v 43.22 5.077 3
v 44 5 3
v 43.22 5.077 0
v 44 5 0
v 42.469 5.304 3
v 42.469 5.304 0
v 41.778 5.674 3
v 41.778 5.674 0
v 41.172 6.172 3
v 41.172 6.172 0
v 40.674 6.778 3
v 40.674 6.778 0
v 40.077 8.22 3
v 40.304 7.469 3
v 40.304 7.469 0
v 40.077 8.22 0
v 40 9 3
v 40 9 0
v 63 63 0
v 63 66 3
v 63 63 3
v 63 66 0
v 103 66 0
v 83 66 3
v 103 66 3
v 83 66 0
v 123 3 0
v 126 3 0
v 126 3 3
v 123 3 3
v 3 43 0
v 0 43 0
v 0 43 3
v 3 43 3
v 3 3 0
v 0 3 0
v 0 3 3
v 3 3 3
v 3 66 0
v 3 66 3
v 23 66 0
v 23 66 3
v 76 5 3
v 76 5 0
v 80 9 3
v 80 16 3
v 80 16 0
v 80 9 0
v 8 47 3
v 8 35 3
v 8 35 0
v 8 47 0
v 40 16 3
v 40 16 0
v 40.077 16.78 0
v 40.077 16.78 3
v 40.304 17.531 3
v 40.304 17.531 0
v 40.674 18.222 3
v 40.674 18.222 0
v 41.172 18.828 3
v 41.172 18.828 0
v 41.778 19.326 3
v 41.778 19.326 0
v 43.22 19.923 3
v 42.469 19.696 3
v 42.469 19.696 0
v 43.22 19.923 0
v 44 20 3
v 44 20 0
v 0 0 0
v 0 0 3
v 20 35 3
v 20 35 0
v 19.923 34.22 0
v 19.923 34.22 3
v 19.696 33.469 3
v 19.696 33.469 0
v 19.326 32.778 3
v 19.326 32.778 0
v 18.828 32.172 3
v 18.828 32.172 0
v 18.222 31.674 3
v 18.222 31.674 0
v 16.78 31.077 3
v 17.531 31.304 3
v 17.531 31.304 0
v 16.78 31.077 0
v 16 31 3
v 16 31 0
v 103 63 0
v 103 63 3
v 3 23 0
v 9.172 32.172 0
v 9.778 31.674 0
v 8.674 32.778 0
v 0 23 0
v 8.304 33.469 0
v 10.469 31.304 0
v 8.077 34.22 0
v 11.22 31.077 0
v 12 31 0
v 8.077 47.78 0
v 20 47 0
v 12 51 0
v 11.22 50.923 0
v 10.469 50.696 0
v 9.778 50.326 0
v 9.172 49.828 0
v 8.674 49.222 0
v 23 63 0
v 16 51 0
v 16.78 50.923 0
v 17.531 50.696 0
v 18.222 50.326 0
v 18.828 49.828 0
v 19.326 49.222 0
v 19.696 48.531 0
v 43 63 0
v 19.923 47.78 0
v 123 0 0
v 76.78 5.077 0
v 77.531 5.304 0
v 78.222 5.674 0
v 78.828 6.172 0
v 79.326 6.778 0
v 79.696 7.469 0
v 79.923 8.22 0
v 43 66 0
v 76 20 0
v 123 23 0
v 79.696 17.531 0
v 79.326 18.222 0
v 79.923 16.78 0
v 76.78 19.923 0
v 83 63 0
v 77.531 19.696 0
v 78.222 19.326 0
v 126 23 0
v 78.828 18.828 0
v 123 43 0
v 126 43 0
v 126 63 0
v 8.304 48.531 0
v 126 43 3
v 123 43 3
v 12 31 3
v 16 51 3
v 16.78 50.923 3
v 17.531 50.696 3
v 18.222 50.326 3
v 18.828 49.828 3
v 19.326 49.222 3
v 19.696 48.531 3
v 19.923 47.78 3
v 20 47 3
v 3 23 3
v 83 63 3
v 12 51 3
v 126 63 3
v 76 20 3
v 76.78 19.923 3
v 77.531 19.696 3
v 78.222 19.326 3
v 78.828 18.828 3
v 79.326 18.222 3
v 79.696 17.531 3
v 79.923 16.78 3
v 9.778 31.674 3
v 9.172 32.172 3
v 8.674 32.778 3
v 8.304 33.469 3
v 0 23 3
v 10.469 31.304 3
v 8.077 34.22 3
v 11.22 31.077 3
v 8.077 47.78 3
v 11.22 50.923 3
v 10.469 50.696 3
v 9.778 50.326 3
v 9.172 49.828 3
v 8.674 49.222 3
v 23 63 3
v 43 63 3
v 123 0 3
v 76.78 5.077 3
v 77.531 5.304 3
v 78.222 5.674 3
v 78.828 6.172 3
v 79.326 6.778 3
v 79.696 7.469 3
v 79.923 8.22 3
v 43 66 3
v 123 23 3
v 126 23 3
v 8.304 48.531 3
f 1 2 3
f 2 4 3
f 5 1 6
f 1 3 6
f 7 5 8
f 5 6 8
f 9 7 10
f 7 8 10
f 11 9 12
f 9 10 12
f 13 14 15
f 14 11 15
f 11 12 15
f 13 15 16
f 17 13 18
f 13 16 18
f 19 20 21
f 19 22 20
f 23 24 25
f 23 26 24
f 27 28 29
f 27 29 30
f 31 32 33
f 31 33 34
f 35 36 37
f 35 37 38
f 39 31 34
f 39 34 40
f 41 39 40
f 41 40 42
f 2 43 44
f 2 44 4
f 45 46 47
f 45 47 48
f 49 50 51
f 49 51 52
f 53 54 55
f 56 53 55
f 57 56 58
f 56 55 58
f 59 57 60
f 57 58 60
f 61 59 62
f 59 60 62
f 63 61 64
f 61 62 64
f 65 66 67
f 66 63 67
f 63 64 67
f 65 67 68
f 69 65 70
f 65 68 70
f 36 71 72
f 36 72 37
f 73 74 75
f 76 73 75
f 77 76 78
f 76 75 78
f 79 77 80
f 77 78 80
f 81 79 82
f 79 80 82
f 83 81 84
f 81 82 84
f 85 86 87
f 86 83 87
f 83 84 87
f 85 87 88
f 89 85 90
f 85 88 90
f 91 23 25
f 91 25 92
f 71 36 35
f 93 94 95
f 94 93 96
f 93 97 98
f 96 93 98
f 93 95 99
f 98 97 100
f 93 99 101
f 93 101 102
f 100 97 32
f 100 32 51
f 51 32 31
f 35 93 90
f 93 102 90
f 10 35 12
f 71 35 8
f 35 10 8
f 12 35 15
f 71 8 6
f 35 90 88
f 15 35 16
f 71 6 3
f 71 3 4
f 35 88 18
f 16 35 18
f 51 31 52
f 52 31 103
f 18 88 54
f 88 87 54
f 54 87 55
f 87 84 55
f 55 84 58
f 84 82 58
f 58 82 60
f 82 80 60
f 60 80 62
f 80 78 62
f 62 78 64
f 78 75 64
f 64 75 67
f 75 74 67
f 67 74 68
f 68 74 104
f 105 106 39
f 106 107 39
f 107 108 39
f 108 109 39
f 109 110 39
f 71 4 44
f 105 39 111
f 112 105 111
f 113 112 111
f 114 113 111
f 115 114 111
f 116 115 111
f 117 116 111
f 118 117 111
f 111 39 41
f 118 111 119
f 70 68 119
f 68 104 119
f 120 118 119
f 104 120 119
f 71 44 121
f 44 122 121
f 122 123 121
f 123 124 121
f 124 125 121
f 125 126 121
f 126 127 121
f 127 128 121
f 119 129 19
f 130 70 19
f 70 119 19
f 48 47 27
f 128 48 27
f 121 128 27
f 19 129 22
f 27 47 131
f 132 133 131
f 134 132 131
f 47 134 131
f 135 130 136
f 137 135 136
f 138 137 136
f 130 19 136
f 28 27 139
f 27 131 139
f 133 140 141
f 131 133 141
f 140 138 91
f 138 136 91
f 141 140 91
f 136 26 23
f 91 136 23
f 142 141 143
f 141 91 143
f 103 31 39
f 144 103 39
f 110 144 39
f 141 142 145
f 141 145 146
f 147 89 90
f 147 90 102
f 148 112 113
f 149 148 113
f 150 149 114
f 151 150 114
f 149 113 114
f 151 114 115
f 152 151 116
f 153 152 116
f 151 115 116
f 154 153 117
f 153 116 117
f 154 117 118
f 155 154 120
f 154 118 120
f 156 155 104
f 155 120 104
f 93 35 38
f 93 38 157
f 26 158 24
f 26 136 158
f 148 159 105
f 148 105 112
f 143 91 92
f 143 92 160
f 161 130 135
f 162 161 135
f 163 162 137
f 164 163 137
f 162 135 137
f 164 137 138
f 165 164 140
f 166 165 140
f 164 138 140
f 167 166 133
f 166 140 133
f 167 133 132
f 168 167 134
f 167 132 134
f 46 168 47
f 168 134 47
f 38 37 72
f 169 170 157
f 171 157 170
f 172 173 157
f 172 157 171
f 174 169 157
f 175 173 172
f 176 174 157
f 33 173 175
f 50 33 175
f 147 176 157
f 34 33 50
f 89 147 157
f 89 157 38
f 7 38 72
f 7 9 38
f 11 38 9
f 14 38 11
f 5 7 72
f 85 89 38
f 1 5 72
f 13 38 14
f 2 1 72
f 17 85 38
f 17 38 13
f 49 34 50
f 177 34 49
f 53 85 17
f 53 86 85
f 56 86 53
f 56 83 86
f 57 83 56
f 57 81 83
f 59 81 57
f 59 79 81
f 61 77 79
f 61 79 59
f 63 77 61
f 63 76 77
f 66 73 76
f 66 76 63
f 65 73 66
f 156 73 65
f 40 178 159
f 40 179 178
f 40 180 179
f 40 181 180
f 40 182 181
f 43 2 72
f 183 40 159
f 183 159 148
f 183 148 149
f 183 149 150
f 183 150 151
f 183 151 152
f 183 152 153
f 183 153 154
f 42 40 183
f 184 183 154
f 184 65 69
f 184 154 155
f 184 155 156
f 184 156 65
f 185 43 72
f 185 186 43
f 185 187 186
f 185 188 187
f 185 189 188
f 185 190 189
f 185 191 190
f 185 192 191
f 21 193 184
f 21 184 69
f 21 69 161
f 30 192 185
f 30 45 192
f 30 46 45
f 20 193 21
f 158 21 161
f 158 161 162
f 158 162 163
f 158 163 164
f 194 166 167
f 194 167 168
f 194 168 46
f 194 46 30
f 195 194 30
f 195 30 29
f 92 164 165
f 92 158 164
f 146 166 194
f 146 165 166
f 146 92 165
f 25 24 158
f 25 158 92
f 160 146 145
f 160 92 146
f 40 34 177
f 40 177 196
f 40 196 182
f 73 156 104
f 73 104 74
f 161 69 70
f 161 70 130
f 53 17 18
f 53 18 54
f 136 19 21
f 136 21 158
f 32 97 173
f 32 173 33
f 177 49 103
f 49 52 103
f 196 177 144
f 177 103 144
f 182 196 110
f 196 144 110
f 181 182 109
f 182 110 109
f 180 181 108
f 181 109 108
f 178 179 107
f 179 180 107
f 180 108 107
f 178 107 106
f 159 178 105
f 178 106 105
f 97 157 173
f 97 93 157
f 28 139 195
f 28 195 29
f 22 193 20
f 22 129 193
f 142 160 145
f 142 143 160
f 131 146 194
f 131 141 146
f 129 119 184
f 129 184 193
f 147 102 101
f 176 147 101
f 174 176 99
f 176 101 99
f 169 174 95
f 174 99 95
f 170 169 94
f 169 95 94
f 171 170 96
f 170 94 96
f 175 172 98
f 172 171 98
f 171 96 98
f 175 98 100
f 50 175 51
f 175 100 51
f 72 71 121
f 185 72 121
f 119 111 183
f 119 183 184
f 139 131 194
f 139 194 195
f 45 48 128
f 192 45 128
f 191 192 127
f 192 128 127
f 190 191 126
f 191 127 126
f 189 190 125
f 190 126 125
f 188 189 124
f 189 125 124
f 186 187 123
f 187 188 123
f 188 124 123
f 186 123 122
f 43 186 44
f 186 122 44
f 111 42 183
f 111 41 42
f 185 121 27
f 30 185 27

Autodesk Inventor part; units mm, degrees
ref_plane "YZ Plane" through (0, 0, 0) normal (1, 0, 0) x (0, 1, 0)
ref_plane "XZ Plane" through (0, 0, 0) normal (0, 1, 0) x (-1, 0, 0)
ref_plane "XY Plane" through (0, 0, 0) normal (0, 0, 1) x (1, 0, 0)
sketch "Sketch1" plane through (0, 0, 0) normal (0, 0, 1) x (1, 0, 0)
  line L0 (0, 0) -> (3, 0)
  line L1 (3, 0) -> (123, 0)
  line L2 (0, 0) -> (0, 3)
  line L3 (0, 3) -> (3, 3)
  line L4 (3, 3) -> (3, 23)
  line L5 (3, 23) -> (0, 23)
  line L6 (0, 23) -> (0, 43)
  line L7 (0, 43) -> (3, 43)
  line L8 (3, 43) -> (3, 63)
  line L9 (3, 63) -> (3, 66)
  line L10 (3, 66) -> (23, 66)
  line L11 (23, 66) -> (23, 63)
  line L12 (23, 63) -> (43, 63)
  line L13 (43, 63) -> (43, 66)
  line L14 (43, 66) -> (63, 66)
  line L15 (63, 66) -> (63, 63)
  line L16 (63, 63) -> (83, 63)
  line L17 (83, 63) -> (83, 66)
  line L18 (83, 66) -> (103, 66)
  line L19 (103, 66) -> (103, 63)
  line L20 (103, 63) -> (123, 63)
  line L21 (123, 63) -> (126, 63)
  line L22 (126, 63) -> (126, 43)
  line L23 (126, 43) -> (123, 43)
  line L24 (123, 43) -> (123, 23)
  line L25 (123, 23) -> (126, 23)
  line L26 (126, 23) -> (126, 3)
  line L27 (126, 3) -> (123, 3)
  line L28 (123, 0) -> (123, 3)
  dimension "d0" = 3
  dimension "d1" = 120
  dimension "d2" = 3
  dimension "d3" = 20
  dimension "d4" = 20
  dimension "d5" = 20
  dimension "d6" = 3
  dimension "d7" = 20
  dimension "d8" = 20
  dimension "d9" = 20
  dimension "d10" = 20
  dimension "d11" = 20
  dimension "d12" = 20
  dimension "d13" = 3
  dimension "d14" = 20
  dimension "d15" = 20
  dimension "d16" = 20
extrude "Extrusion1" add sketch "Sketch1" along normal blind 3
sketch "Sketch2" plane through (0, 0, 3) normal (0, 0, 1) x (1, 0, 0)
  line L0 (40, 20) -> (80, 20)
  line L1 (80, 20) -> (80, 5)
  line L2 (80, 5) -> (40, 5)
  line L3 (40, 5) -> (40, 20)
  line L4 (0, 0) -> (123, 0) projected
  line L5 (8, 51) -> (20, 51)
  line L6 (20, 51) -> (20, 31)
  line L7 (20, 31) -> (8, 31)
  line L8 (8, 31) -> (8, 51)
  line L9 (43, 63) -> (23, 63) projected
  line L10 (3, 23) -> (3, 3) projected
  dimension "d19" = 40
  dimension "d20" = 15
  dimension "d21" = 5
  dimension "d22" = 40
  dimension "d26" = 12
  dimension "d27" = 20
  dimension "d28" = 12
  dimension "d29" = 5
extrude "Extrusion2" cut sketch "Sketch2" against normal up to next
fillet "Fillet1" radius 4 8 edges at (20, 31, 1.5) (20, 51, 1.5) (8, 51, 1.5) (8, 31, 1.5) (80, 5, 1.5) (80, 20, 1.5) (40, 20, 1.5) (40, 5, 1.5)
properties part number "ControlBoxFanFace" material "Wood (Birch)"
